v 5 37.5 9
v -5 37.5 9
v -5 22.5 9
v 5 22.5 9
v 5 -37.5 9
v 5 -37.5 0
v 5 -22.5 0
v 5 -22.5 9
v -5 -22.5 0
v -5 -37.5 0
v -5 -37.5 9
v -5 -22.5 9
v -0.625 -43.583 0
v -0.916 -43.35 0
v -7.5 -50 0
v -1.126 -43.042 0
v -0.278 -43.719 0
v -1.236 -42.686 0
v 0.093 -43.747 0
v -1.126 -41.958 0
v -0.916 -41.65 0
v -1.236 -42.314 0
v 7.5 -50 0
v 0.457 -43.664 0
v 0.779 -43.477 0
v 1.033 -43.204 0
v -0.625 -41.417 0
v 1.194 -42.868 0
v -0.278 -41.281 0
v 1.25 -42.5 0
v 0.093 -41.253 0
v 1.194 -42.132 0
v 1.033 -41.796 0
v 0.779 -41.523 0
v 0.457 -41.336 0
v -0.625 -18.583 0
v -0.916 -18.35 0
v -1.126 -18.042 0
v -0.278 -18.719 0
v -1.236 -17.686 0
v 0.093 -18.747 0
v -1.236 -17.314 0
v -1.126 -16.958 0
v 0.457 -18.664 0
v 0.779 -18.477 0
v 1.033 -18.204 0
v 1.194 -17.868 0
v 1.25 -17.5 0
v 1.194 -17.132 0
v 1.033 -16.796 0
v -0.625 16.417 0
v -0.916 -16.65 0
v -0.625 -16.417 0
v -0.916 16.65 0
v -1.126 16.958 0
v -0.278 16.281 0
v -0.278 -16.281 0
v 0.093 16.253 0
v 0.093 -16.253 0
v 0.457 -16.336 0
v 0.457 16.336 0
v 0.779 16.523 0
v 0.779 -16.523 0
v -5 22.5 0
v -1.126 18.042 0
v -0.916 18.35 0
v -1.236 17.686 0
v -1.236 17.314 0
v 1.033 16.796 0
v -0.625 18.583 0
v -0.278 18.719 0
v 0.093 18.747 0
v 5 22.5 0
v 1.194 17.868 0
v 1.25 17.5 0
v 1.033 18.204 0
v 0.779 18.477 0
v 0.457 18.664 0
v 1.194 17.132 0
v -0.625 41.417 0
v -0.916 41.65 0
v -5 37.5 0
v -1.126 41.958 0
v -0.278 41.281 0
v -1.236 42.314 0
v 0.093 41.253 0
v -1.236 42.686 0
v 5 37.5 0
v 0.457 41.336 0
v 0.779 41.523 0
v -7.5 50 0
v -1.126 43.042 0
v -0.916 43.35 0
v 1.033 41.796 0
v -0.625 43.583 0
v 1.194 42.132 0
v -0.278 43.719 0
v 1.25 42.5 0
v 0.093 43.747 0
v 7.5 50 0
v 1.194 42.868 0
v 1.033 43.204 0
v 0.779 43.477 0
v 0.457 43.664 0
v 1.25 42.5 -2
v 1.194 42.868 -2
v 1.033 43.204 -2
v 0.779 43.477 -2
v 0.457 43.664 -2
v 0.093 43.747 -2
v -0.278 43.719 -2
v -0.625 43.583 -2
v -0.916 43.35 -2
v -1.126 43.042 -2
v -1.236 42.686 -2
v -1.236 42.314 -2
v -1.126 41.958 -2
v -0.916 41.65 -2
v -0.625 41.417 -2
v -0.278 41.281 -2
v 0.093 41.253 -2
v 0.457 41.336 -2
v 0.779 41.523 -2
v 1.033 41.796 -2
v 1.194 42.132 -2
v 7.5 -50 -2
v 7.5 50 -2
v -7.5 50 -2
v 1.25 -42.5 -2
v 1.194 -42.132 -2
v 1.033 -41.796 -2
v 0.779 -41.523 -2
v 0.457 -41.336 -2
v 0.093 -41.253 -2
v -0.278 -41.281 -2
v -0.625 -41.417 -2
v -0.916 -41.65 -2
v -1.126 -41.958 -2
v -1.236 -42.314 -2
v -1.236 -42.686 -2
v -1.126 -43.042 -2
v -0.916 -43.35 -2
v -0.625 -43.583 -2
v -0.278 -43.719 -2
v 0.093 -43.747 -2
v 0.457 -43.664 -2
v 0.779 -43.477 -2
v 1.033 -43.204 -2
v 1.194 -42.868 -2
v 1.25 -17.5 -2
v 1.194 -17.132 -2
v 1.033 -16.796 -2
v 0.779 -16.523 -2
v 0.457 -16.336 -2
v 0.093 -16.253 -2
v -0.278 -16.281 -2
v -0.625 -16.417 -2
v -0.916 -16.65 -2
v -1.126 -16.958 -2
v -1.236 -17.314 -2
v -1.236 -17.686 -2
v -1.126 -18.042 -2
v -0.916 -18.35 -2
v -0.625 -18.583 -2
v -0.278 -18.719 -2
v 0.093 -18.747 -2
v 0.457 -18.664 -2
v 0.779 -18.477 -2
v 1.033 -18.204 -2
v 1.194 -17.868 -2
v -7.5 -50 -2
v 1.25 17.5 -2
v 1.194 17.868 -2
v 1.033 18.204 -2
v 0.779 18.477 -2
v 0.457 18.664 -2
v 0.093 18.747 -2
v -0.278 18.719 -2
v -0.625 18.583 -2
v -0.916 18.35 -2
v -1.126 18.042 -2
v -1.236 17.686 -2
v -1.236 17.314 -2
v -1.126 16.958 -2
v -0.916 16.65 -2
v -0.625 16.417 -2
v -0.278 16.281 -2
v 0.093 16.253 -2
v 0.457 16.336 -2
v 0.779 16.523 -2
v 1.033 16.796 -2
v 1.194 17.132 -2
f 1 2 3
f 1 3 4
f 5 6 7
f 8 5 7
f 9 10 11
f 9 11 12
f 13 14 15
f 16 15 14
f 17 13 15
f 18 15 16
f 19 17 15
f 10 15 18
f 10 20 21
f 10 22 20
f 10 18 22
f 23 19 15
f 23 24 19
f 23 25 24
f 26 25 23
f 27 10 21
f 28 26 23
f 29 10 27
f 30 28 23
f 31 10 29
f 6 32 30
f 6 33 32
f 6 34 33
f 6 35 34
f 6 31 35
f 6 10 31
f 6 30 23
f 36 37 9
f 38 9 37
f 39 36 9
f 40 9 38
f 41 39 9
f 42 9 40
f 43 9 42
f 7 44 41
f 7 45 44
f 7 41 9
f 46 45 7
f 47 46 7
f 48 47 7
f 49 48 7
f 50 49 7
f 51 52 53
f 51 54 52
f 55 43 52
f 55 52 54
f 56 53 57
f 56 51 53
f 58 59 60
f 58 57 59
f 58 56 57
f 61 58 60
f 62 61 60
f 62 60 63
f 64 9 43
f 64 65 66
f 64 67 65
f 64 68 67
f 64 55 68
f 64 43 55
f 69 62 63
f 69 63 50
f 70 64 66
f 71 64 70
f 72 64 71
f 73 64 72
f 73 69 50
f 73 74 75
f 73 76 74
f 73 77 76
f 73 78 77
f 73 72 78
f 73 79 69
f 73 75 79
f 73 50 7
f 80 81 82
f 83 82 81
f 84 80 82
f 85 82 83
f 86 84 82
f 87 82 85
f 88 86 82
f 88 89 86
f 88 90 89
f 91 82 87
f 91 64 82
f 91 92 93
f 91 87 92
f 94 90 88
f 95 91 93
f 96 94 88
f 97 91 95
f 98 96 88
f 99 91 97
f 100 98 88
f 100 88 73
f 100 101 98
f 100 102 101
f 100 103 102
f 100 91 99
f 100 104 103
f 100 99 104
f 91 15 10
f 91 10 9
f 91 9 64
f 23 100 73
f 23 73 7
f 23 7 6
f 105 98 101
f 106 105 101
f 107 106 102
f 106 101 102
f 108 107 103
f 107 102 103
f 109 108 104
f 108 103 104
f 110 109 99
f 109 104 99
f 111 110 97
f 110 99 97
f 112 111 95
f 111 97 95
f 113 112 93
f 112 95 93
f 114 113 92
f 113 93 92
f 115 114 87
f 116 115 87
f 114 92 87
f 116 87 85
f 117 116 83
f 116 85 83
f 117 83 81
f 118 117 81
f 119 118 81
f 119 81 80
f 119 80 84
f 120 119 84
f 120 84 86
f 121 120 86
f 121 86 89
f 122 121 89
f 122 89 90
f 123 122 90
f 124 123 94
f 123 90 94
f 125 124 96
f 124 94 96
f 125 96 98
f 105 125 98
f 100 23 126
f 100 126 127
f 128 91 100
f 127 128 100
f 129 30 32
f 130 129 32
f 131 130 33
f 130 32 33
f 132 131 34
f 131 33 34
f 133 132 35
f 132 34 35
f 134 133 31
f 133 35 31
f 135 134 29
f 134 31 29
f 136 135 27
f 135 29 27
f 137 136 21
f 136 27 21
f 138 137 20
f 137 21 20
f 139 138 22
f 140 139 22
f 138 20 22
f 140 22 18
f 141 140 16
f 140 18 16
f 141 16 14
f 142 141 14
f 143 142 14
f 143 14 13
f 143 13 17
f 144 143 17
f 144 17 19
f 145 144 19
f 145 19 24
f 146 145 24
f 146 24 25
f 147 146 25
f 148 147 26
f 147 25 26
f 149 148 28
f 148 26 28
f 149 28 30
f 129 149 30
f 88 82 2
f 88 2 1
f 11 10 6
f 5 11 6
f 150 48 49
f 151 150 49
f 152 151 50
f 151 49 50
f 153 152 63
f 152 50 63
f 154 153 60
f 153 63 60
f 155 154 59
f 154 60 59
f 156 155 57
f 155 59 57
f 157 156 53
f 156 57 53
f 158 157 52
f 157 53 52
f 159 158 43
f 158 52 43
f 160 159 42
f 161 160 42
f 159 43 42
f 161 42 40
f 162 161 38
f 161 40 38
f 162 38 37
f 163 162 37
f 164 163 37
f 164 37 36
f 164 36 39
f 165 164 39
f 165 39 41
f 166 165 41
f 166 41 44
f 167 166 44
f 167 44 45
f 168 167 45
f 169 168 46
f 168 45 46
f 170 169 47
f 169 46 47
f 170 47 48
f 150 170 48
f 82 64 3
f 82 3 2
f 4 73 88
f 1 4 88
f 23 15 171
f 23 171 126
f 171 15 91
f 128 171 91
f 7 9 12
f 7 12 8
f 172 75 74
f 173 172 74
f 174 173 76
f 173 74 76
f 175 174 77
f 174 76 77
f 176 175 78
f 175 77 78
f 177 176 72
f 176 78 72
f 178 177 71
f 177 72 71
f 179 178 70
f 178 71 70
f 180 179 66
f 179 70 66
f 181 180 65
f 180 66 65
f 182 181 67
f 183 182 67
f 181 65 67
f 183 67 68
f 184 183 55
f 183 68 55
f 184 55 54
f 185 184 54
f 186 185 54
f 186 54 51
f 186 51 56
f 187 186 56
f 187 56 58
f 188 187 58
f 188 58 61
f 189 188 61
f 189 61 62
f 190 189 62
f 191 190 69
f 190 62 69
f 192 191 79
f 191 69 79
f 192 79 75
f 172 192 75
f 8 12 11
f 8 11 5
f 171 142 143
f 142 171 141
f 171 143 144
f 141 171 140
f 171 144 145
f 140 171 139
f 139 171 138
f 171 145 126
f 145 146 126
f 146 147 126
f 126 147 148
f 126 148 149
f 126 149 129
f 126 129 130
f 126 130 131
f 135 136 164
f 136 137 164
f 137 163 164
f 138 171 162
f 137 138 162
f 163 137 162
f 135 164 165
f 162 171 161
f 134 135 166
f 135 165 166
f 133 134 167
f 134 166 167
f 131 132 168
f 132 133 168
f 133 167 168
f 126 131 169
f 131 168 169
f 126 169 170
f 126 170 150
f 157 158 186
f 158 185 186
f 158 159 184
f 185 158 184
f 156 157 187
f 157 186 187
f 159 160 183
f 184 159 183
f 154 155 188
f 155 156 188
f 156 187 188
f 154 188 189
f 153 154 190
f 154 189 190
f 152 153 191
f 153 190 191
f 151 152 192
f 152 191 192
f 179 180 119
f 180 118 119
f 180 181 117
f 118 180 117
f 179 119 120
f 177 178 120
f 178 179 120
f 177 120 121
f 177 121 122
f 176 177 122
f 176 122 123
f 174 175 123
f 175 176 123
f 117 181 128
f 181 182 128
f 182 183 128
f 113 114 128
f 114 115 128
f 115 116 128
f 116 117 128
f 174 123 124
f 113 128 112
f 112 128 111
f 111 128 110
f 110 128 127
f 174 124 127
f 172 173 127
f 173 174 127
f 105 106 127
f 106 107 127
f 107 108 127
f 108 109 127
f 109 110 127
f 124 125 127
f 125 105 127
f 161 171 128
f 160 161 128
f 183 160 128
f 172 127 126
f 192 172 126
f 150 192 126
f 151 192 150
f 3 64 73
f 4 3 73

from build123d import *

# Parameters (mm, degrees)
CROQUIS1_W              = 15
CROQUIS1_H              = 100
CROQUIS1_R              = 1.25
SALIENTE_EXTRUIR1_DEPTH = 2
CROQUIS2_W              = 10
CROQUIS2_H              = 15
SALIENTE_EXTRUIR2_DEPTH = 9


with BuildPart() as part:
    # Croquis1 → Saliente-Extruir1 (new body)
    with BuildSketch(Plane.XY):
        Rectangle(CROQUIS1_W, CROQUIS1_H)
        with Locations((0, 42.5)):
            Circle(CROQUIS1_R, mode=Mode.SUBTRACT)
        with Locations((0, 17.5)):
            Circle(CROQUIS1_R, mode=Mode.SUBTRACT)
        with Locations((0, -42.5)):
            Circle(CROQUIS1_R, mode=Mode.SUBTRACT)
        with Locations((0, -17.5)):
            Circle(CROQUIS1_R, mode=Mode.SUBTRACT)
    extrude(amount=-SALIENTE_EXTRUIR1_DEPTH)

    # Croquis2 → Saliente-Extruir2 (add)
    with BuildSketch(Plane.XY):
        with Locations((0, 30)):
            Rectangle(CROQUIS2_W, CROQUIS2_H)
        with Locations((0, -30)):
            Rectangle(CROQUIS2_W, CROQUIS2_H)
    extrude(amount=SALIENTE_EXTRUIR2_DEPTH)


solid = part.part
